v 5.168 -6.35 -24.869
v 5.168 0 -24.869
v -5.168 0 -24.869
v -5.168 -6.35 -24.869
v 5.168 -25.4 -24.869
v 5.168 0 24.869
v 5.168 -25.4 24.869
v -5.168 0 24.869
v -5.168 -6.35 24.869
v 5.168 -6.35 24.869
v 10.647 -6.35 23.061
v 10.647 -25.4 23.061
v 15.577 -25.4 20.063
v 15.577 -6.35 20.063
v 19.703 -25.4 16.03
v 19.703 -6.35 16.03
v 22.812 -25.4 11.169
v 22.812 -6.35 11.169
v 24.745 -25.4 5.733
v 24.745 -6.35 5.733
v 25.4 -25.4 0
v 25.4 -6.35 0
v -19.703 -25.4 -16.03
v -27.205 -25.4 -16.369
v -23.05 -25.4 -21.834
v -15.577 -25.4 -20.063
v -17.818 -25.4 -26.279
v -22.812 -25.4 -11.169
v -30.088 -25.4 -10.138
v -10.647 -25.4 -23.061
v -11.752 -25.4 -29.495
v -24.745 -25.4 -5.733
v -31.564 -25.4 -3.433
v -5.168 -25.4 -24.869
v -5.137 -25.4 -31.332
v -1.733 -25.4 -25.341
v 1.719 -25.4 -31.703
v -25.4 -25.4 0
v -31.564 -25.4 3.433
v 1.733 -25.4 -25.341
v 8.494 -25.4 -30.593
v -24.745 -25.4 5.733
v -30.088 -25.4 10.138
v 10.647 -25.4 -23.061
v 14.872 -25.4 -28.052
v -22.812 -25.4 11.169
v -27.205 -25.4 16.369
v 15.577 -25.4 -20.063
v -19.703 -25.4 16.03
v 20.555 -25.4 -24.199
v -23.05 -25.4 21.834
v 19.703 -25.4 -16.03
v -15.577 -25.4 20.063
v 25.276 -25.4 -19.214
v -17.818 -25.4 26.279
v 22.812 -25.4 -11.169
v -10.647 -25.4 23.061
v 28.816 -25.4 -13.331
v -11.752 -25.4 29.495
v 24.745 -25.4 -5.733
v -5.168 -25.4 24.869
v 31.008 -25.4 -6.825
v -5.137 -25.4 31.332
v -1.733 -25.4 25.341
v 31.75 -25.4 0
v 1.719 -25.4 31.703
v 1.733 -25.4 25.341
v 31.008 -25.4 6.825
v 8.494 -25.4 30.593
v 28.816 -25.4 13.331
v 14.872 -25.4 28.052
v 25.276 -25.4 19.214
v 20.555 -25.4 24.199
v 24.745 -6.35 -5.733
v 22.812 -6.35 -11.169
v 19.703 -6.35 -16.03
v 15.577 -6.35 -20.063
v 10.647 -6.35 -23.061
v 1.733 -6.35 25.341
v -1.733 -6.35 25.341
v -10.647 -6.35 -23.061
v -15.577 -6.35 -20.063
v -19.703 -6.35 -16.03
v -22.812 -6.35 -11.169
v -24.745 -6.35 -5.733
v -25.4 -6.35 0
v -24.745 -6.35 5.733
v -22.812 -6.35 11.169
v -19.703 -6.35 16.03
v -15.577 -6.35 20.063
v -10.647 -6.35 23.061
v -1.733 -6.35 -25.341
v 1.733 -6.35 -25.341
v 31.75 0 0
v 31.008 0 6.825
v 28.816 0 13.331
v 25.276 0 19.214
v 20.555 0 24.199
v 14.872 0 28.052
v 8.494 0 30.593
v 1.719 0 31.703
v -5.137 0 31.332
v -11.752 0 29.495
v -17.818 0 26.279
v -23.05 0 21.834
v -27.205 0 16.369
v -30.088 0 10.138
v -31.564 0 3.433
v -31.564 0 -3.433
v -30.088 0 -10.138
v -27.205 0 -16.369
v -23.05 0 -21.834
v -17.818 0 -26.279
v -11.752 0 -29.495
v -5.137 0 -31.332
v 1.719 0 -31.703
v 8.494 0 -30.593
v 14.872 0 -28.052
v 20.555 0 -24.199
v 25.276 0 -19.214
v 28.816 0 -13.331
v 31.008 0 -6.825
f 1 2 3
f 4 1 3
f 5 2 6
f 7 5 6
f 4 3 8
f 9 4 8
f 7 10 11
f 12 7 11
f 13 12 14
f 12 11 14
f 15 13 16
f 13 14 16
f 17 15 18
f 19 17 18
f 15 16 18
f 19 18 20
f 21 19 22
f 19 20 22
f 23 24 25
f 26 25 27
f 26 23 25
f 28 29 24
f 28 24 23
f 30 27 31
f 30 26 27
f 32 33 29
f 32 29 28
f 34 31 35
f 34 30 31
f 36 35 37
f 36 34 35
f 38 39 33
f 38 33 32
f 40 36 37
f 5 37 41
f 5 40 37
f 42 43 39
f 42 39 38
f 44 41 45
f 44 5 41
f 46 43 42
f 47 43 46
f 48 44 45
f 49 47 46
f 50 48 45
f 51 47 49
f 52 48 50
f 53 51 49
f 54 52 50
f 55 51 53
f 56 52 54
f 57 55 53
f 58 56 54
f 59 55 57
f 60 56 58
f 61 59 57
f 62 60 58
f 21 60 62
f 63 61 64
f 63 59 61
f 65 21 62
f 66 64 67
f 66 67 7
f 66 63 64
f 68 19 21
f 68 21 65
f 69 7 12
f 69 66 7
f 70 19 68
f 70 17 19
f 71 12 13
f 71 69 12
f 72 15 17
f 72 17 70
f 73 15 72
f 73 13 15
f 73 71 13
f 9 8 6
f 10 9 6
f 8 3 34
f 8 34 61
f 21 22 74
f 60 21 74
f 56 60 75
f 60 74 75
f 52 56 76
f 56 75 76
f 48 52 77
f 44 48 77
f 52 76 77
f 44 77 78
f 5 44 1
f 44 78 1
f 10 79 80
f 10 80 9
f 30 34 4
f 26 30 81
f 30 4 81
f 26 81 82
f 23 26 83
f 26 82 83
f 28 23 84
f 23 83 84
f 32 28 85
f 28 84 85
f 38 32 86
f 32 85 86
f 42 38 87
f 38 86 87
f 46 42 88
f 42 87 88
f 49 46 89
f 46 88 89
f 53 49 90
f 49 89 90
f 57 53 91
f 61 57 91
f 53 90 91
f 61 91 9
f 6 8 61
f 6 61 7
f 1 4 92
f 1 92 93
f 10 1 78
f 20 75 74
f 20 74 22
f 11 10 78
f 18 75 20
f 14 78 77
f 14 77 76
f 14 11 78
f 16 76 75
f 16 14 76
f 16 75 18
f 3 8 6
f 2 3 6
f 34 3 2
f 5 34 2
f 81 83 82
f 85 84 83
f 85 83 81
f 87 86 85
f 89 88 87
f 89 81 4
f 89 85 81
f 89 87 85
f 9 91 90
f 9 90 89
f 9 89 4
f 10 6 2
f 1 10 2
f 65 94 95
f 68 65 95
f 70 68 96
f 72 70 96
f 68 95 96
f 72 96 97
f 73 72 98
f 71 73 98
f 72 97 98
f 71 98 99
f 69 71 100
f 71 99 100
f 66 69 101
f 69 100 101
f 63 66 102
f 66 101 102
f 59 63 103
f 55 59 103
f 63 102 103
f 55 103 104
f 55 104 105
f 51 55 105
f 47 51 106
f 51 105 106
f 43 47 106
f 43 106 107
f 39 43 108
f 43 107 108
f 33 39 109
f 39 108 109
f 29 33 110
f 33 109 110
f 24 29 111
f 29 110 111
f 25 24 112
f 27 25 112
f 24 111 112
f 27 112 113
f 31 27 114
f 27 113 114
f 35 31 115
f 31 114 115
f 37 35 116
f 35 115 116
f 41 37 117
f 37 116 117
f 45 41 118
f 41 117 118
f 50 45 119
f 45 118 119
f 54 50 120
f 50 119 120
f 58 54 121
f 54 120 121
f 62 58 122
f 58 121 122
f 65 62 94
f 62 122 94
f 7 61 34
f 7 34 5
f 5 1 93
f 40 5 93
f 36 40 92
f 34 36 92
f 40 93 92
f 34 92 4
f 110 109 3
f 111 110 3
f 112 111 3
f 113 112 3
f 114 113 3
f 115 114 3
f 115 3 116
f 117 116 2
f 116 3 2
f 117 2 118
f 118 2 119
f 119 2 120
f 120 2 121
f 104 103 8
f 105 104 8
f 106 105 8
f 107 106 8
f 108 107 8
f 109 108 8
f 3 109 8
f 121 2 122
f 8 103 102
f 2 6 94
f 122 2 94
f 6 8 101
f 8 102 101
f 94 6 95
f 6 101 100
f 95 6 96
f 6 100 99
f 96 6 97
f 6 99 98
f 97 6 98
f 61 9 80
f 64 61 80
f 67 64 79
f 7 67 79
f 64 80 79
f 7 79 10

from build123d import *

# Parameters (mm, degrees)
F0_R     = 31.75
F1_DEPTH = 25.4
F2_DEPTH = 6.35
F0_W     = 10.3356370534
F0_H     = 49.7374567776
F3_DEPTH = 25.4


with BuildPart() as f1:
    # F0 (on Front) → F1 (new body)
    with BuildSketch(Plane.XZ):
        Circle(F0_R)
        with BuildLine():
            ThreePointArc((5.1678185267, 24.8687283888), (19.7030783201, 16.0296196059), (25.4, 0))
            ThreePointArc((25.4, 0), (19.7030783201, -16.0296196059), (5.1678185267, -24.8687283888))
            ThreePointArc((5.1678185267, -24.8687283888), (0, -25.4), (-5.1678185267, -24.8687283888))
            ThreePointArc((-5.1678185267, -24.8687283888), (-25.4, 0), (-5.1678185267, 24.8687283888))
            ThreePointArc((-5.1678185267, 24.8687283888), (0, 25.4), (5.1678185267, 24.8687283888))
        make_face(mode=Mode.SUBTRACT)
    extrude(amount=F1_DEPTH)

    # F0 (on Front) → F2 (join)
    with BuildSketch(Plane.XZ):
        with BuildLine():
            Line((-5.1678185267, 24.8687283888), (5.1678185267, 24.8687283888))
            ThreePointArc((5.1678185267, 24.8687283888), (0, 25.4), (-5.1678185267, 24.8687283888))
        make_face()
        with BuildLine():
            Line((-5.1678185267, -24.8687283888), (-5.1678185267, 24.8687283888))
            ThreePointArc((-5.1678185267, 24.8687283888), (-25.4, 0), (-5.1678185267, -24.8687283888))
        make_face()
        with BuildLine():
            ThreePointArc((-5.1678185267, -24.8687283888), (0, -25.4), (5.1678185267, -24.8687283888))
            Line((5.1678185267, -24.8687283888), (-5.1678185267, -24.8687283888))
        make_face()
        with BuildLine():
            ThreePointArc((5.1678185267, -24.8687283888), (19.7030783201, -16.0296196059), (25.4, 0))
            ThreePointArc((25.4, 0), (19.7030783201, 16.0296196059), (5.1678185267, 24.8687283888))
            Line((5.1678185267, 24.8687283888), (5.1678185267, -24.8687283888))
        make_face()
    extrude(amount=F2_DEPTH)


with BuildPart() as f3:
    # F0 (on Front) → F3 (new body)
    with BuildSketch(Plane.XZ):
        Rectangle(F0_W, F0_H)
    extrude(amount=F3_DEPTH)


solid = Compound([f1.part, f3.part])
